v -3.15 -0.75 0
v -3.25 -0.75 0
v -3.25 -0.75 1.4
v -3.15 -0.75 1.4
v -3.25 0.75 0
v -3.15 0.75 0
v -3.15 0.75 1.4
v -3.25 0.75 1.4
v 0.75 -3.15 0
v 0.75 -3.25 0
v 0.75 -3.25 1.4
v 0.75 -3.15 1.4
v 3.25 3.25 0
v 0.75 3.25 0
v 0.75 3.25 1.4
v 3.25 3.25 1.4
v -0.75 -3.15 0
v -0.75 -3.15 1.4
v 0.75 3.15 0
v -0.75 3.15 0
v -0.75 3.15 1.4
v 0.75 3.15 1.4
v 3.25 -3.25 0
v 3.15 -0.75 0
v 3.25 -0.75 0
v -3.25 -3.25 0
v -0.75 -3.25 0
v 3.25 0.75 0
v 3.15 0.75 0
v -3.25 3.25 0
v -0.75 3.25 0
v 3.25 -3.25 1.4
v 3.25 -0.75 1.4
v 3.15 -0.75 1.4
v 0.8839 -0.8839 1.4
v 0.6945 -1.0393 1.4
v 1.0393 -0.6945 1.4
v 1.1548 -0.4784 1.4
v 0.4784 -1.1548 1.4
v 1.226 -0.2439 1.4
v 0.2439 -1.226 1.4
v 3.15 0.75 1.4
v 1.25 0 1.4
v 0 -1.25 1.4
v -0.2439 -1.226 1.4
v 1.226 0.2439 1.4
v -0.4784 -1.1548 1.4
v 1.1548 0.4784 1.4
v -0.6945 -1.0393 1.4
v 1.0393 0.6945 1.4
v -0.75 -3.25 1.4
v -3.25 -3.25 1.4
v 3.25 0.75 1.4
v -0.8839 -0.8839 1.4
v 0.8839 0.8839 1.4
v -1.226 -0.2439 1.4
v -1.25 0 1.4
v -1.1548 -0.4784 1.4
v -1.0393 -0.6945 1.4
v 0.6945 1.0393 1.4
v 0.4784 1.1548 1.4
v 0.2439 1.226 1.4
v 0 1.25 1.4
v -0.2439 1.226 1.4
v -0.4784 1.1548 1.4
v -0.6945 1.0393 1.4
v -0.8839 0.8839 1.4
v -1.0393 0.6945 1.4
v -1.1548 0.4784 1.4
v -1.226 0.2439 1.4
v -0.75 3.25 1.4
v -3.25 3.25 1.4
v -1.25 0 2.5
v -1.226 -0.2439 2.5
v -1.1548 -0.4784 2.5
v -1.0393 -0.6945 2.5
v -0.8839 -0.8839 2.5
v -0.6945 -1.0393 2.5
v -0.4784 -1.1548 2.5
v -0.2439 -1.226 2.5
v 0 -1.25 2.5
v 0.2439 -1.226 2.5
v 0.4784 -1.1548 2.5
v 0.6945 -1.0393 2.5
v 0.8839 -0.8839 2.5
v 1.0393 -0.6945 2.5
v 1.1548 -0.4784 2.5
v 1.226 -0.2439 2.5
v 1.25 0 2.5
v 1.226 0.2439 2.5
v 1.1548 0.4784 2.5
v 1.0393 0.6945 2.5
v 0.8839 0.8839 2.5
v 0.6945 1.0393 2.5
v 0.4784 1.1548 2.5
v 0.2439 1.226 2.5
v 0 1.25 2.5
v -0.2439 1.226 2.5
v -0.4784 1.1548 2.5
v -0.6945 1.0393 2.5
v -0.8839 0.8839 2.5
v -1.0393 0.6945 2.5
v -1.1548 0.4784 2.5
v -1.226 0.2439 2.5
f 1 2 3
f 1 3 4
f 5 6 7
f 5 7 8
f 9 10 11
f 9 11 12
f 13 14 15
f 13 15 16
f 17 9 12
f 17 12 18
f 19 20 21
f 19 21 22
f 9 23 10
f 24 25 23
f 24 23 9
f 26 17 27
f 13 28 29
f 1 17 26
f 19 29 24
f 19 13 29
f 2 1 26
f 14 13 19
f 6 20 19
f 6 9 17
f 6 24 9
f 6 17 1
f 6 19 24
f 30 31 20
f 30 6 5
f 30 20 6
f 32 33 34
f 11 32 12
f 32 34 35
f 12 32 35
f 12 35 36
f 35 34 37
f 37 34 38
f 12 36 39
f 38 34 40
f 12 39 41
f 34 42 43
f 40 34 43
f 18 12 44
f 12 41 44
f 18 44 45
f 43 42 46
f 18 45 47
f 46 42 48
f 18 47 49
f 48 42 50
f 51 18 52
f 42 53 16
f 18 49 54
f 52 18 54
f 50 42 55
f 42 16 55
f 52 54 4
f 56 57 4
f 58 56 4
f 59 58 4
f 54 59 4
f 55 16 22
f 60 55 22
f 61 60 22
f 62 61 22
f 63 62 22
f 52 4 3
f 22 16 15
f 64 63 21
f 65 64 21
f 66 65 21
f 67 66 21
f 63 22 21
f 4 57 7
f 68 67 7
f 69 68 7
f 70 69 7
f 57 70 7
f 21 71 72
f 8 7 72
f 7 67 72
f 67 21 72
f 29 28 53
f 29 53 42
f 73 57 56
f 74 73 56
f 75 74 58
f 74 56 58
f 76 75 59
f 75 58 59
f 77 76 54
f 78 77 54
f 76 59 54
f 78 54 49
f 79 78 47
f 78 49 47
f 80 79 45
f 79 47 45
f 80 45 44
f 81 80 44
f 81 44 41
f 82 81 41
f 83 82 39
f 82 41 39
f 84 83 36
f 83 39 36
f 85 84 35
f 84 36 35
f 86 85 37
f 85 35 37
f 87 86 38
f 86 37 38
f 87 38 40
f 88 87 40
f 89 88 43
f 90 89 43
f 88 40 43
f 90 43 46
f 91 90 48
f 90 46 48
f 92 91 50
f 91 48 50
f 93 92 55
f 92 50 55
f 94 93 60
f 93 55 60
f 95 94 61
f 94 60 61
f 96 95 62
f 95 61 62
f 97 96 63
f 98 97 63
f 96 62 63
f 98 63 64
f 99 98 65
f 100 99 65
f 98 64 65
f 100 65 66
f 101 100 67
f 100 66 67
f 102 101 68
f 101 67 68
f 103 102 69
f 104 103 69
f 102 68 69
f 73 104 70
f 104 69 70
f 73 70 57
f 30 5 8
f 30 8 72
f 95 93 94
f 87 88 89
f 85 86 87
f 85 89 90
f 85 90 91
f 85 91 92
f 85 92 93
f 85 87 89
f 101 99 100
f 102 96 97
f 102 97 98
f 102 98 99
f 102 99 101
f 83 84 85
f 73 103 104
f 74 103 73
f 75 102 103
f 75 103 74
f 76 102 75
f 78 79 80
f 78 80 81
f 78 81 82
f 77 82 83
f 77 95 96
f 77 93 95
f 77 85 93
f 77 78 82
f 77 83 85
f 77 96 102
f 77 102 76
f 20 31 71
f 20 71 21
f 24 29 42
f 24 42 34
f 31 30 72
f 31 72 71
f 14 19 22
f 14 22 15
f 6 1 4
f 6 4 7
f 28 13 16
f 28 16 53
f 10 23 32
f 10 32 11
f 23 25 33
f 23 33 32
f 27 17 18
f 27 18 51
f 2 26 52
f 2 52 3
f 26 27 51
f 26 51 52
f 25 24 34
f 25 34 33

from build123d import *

# Parameters (mm, degrees)
BOSS_EXTRU_1_DEPTH = 1.4
ESQUISSE2_R        = 1.25
BOSS_EXTRU_2_DEPTH = 1.1


with BuildPart() as part:
    # Esquisse1 → Boss.-Extru.1 (new body)
    with BuildSketch(Plane.XY):
        Polygon((-3.25, 0.75), (-3.25, 3.25), (-0.75, 3.25), (-0.75, 3.15), (0.75, 3.15), (0.75, 3.25), (3.25, 3.25), (3.25, 0.75), (3.15, 0.75), (3.15, -0.75), (3.25, -0.75), (3.25, -3.25), (0.75, -3.25), (0.75, -3.15), (-0.75, -3.15), (-0.75, -3.25), (-3.25, -3.25), (-3.25, -0.75), (-3.15, -0.75), (-3.15, 0.75), align=None)
    extrude(amount=BOSS_EXTRU_1_DEPTH)

    # Esquisse2 → Boss.-Extru.2 (add)
    with BuildSketch(Plane.XY.offset(1.4)):
        with Locations(Location((0, 0, 0), (0, 0, 180))):
            Circle(ESQUISSE2_R)
    extrude(amount=BOSS_EXTRU_2_DEPTH)


solid = part.part
